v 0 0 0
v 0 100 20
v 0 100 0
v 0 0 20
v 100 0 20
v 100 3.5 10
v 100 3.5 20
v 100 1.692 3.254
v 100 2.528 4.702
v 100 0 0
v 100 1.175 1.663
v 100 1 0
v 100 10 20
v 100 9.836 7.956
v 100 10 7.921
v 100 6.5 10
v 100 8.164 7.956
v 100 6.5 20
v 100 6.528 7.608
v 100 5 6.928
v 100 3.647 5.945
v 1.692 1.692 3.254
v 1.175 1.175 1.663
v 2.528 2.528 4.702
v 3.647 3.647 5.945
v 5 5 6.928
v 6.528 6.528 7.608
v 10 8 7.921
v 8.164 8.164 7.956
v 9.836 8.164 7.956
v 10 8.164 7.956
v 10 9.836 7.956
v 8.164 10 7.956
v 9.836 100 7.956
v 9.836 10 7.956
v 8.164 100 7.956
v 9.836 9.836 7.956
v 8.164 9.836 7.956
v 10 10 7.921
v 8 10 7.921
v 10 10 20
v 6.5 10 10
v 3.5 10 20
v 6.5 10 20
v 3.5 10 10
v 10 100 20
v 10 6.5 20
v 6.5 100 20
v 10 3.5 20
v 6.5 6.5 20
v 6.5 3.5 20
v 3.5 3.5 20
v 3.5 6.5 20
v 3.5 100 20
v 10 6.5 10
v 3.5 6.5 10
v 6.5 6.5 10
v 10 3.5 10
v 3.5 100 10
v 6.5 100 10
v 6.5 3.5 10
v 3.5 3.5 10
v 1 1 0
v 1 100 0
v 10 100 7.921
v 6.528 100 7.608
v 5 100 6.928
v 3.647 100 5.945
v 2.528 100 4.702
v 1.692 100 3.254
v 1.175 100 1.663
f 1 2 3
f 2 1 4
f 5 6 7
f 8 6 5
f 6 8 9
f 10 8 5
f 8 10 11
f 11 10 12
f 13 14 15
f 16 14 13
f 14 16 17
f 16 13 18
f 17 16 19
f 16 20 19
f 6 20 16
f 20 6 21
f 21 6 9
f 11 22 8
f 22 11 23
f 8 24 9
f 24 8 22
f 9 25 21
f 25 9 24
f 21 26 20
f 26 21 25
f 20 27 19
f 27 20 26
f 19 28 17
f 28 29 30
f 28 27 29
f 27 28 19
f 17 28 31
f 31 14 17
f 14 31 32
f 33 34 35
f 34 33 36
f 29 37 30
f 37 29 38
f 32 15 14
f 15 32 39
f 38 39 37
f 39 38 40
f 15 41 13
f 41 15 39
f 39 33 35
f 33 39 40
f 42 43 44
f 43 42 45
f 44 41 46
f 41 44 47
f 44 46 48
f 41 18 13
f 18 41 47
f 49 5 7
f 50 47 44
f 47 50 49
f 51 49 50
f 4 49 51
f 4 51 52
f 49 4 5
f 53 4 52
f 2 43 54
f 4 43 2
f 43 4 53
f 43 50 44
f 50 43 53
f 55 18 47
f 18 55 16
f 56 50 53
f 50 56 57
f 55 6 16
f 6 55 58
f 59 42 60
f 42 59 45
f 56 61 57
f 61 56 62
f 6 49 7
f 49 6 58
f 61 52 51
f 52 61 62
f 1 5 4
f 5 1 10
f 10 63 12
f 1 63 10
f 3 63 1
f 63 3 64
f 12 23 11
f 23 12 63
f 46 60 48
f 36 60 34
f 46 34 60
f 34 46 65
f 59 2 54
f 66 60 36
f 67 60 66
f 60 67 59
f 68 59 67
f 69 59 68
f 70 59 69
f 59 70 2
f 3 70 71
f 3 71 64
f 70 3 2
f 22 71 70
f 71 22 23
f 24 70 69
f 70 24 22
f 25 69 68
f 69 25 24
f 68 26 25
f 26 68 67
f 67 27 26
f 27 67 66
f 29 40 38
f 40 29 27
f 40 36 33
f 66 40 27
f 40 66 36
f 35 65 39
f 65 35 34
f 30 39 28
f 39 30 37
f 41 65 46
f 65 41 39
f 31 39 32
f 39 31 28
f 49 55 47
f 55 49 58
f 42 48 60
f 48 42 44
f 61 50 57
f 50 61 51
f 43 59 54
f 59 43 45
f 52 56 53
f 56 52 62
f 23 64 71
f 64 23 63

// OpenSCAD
wallWidth = 1;
$fs = 1;

module cylinder_outer(height, diameter, fs) {
   radius = diameter / 2;
   fn = floor(360 / acos(1 - (fs*fs) / (2*radius*radius)));
   fudge = 1/cos(180/fn);
   cylinder(h=height, d=diameter*fudge, $fn=fn);
}

module rail(length) {
    rotate([90,0,90])
    linear_extrude(height=length) {
        difference() {
            width = 10;
            holeWidth = 3;
            holeX = (width - holeWidth) / 2;

            height = 20;
            holeHeight = 10;
            holeY = height - holeHeight;

            archRadius = 8;
            archX = archRadius + wallWidth;
            archY = 0;

            square([width, height]);
            translate([holeX, holeY]) {
                square([holeWidth, holeHeight + 1]);
            }
            translate([archX, archY]) {
                circle(archRadius);
            }

        }
    }
}

module rail_corner() {
}

rail(length=100);
translate([0, 100, 0])
rotate([0, 0, -90])
rail(length=100);
